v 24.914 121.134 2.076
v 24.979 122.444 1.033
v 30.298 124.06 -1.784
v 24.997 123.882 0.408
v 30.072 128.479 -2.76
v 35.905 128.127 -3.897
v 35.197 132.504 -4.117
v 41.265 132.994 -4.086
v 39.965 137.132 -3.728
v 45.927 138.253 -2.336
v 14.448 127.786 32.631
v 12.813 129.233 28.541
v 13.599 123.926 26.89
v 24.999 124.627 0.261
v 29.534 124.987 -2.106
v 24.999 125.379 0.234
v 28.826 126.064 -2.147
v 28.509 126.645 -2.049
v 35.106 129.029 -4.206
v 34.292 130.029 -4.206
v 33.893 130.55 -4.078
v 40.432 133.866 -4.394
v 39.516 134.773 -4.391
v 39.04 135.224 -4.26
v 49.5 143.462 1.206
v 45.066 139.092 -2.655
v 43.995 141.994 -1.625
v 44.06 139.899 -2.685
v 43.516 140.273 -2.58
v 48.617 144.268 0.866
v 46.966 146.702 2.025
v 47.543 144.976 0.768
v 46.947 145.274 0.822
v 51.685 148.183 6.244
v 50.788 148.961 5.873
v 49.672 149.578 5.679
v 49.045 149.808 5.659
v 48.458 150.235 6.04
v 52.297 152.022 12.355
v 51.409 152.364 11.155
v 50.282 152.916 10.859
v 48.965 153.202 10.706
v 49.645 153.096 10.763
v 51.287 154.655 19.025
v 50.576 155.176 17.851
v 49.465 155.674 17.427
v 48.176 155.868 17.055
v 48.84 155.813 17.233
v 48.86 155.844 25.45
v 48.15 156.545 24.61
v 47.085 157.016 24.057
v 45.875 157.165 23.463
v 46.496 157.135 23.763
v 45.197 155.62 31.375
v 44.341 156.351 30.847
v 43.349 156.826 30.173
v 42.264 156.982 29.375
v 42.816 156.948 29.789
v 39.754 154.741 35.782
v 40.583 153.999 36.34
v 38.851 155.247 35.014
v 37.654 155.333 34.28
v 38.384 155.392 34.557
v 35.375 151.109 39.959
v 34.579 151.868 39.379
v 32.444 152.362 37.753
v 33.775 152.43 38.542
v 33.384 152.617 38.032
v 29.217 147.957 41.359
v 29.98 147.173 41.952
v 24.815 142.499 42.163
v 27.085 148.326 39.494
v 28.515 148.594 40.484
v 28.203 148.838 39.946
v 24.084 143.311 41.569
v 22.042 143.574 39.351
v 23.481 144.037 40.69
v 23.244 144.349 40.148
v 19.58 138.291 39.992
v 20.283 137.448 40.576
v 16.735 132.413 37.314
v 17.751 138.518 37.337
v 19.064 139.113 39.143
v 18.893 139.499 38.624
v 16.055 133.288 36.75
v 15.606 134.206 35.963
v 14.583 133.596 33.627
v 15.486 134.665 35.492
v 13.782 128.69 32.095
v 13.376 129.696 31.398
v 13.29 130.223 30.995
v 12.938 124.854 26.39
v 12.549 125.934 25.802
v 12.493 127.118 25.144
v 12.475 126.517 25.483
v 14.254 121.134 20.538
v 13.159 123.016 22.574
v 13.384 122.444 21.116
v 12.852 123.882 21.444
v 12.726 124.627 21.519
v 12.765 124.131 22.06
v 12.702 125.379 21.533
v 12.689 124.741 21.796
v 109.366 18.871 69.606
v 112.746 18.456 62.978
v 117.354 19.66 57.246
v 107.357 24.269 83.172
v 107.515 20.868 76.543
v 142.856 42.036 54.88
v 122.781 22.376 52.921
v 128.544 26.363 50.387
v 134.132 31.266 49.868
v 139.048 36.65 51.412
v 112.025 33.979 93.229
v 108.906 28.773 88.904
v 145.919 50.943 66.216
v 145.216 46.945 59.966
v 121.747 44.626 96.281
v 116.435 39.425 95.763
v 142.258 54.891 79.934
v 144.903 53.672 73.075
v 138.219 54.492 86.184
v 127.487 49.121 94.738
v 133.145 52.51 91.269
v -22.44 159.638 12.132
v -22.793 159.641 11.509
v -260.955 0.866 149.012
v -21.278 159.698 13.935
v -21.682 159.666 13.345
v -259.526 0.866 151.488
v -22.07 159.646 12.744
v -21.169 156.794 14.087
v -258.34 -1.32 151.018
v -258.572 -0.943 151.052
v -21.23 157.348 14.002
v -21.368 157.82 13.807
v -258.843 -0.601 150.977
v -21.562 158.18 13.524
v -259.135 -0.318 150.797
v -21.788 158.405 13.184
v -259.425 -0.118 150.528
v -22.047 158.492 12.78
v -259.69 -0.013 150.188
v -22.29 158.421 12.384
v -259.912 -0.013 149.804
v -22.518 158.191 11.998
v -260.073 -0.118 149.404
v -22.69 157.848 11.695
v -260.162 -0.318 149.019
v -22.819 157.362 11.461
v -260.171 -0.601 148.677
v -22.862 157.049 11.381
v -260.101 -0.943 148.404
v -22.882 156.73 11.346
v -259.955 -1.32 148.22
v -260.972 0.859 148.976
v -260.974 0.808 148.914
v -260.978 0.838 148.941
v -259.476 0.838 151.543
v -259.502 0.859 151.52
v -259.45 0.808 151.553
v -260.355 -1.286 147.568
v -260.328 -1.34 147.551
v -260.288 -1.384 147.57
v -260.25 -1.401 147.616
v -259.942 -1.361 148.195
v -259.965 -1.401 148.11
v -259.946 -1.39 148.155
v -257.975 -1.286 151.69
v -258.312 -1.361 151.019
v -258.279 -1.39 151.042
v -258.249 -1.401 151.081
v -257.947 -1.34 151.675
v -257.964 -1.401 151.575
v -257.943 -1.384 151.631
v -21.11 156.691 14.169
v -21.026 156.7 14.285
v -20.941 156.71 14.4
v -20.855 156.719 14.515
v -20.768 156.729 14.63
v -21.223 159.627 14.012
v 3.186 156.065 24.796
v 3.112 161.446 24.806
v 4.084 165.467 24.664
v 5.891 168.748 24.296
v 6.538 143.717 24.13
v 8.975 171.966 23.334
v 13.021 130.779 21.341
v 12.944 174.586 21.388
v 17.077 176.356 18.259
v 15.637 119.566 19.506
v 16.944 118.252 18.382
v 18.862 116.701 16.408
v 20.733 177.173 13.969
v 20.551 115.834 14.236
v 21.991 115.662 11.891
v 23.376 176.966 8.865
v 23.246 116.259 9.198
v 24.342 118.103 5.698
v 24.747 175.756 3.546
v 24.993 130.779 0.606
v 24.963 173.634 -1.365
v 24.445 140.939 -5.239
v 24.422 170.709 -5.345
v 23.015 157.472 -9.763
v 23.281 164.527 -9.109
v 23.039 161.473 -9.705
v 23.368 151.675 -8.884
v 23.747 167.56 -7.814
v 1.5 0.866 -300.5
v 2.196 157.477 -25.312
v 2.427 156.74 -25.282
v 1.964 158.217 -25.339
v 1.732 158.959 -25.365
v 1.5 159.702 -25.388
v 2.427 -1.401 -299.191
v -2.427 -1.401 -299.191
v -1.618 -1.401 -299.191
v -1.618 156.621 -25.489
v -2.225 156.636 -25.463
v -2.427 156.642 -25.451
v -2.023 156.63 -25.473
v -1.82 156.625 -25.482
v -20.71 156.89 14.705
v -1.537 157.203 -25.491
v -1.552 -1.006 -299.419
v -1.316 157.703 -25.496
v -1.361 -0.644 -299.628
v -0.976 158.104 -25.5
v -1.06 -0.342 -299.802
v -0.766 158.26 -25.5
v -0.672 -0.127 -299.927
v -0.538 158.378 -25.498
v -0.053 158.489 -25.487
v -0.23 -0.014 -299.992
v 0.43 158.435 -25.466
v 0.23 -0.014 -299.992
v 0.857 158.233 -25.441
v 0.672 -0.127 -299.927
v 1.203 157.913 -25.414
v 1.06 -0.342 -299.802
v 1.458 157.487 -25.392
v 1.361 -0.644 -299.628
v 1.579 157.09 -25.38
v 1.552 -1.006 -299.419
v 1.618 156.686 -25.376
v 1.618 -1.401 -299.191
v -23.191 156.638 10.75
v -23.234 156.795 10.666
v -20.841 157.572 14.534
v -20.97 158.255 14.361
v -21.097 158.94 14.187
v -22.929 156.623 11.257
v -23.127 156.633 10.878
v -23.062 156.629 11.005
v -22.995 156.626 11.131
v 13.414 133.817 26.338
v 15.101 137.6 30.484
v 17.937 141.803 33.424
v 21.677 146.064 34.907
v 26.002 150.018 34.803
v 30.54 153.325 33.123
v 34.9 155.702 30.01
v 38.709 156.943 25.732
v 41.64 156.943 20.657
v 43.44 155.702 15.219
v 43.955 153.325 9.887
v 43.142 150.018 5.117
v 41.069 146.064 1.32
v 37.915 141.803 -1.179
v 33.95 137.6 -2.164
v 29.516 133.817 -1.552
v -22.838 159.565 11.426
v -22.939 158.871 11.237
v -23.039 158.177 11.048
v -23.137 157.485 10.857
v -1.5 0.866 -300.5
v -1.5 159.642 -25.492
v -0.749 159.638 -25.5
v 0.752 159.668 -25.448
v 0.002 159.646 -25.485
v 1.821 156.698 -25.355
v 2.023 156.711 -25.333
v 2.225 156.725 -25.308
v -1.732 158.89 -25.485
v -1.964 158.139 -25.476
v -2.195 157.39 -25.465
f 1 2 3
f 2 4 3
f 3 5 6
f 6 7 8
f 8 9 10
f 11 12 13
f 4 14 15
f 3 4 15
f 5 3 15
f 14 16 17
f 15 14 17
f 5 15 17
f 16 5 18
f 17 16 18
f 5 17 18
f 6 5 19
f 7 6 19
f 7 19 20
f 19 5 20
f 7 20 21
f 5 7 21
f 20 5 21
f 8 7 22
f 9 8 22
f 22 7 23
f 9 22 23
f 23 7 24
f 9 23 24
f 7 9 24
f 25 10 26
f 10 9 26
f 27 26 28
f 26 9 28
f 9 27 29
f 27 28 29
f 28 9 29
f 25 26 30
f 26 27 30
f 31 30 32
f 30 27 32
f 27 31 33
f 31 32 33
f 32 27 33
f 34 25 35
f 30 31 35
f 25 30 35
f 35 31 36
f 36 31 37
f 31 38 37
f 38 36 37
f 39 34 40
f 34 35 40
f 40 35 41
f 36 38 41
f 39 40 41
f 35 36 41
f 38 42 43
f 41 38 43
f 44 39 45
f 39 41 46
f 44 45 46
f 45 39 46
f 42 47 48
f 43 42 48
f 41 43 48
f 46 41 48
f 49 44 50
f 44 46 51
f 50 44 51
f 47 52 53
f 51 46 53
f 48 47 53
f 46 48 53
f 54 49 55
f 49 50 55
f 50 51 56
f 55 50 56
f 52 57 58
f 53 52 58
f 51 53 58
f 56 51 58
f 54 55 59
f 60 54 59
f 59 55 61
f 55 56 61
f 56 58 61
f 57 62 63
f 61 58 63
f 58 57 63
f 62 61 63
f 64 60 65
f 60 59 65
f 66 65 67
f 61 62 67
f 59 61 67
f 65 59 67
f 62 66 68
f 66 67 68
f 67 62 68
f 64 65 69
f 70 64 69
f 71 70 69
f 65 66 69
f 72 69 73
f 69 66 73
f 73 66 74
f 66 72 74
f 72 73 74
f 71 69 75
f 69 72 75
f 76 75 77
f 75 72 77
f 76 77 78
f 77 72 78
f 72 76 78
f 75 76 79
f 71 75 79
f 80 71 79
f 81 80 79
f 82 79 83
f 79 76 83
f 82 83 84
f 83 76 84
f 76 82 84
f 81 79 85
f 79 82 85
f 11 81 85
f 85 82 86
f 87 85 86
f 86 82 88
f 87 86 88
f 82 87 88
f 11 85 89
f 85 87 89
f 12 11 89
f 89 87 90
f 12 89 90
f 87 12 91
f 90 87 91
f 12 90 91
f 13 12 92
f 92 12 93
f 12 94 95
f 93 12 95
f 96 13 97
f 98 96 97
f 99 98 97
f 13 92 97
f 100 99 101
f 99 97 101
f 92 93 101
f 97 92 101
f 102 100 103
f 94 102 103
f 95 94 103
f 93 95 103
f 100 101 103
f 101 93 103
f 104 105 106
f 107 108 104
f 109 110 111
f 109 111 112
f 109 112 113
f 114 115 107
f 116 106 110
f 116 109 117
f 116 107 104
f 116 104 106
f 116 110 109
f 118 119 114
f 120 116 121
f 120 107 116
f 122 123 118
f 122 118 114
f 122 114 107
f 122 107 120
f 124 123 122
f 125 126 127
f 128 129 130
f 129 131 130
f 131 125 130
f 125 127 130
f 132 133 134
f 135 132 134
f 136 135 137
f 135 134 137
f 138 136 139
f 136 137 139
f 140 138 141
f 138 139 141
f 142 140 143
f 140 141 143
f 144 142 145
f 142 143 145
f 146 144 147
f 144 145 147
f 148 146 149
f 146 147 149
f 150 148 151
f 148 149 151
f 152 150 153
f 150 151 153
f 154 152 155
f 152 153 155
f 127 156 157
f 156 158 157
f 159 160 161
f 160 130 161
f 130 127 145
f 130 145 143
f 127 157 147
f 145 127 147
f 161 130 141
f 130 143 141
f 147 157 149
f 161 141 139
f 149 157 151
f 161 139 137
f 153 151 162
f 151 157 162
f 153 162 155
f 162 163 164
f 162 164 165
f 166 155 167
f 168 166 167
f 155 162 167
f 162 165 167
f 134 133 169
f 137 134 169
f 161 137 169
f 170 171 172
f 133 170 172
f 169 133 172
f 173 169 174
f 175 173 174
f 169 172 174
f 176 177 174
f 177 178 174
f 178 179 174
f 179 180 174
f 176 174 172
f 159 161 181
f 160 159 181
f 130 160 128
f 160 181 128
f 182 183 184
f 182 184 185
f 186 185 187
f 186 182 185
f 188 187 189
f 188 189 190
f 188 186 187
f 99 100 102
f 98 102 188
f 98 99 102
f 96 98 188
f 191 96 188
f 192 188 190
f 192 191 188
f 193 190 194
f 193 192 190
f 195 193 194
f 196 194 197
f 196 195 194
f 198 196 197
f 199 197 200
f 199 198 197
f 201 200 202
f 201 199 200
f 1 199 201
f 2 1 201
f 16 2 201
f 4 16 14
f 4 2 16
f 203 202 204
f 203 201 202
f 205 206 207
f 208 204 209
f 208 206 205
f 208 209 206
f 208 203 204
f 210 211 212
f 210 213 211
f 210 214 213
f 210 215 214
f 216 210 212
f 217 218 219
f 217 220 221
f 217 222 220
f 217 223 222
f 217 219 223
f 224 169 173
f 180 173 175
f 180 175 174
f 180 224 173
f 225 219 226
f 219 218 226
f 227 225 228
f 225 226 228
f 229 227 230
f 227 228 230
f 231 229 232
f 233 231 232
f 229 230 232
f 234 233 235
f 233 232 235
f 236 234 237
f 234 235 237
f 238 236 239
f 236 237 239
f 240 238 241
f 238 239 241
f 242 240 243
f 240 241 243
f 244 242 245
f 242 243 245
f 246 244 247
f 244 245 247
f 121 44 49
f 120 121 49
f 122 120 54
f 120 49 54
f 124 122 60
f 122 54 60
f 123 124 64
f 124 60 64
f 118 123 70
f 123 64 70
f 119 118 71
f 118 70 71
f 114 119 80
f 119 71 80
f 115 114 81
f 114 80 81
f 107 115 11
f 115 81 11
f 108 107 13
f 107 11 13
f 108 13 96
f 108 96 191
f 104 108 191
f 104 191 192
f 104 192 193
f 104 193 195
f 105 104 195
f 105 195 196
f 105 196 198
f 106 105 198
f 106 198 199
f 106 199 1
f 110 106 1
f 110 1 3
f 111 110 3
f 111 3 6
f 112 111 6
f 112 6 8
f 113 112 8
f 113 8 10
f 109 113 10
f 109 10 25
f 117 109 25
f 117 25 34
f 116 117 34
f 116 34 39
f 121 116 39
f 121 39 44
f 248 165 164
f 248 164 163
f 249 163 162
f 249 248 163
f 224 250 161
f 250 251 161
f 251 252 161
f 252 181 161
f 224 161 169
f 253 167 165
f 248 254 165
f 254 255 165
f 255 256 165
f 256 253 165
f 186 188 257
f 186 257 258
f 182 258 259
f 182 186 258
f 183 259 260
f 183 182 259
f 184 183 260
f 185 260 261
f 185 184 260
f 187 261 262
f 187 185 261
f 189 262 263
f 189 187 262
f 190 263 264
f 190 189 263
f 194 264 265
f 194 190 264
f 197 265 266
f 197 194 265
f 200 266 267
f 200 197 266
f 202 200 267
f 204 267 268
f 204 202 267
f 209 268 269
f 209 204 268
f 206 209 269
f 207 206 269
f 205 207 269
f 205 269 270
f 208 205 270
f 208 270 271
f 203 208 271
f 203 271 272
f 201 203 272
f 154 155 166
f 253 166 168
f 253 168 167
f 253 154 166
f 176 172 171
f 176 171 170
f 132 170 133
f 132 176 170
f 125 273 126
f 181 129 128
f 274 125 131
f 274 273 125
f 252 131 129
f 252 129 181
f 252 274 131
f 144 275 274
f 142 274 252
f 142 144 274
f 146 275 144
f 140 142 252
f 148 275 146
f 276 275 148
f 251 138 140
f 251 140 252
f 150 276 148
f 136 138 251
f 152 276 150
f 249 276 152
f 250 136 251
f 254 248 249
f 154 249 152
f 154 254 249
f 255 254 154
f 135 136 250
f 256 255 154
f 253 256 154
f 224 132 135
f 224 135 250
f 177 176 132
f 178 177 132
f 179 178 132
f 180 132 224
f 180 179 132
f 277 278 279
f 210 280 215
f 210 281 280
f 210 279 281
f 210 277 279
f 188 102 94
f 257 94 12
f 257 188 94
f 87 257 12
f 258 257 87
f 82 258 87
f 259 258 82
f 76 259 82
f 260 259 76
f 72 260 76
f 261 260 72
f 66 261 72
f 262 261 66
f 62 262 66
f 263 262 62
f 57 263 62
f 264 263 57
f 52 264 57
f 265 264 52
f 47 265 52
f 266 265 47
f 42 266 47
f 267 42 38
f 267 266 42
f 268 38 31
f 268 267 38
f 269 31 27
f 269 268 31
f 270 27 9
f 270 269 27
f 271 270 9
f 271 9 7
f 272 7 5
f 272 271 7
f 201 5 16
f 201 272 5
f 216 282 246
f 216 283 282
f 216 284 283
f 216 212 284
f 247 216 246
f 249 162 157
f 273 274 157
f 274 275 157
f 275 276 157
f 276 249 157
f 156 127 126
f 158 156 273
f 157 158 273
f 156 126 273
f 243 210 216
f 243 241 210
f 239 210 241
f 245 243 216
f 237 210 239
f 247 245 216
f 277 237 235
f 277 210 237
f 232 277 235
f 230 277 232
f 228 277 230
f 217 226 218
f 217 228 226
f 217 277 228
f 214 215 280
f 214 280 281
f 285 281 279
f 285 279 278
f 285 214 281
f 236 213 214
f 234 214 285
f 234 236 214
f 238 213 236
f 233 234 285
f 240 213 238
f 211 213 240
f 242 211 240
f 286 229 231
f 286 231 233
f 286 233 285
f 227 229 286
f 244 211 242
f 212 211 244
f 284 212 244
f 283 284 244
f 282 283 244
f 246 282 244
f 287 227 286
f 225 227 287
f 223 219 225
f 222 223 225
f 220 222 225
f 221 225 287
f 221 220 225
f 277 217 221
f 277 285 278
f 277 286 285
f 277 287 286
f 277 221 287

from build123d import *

# Parameters (mm, degrees)
CIRPATTERN2_START   = -259.807621119
CIRPATTERN2_DEPTH   = 346.410161535
SKETCH7_R           = 25
CUT_EXTRUDE1_DEPTH  = 435.415827251
SKETCH9_R           = 20
BOSS_EXTRUDE2_DEPTH = 50
SKETCH10_R          = 25
BOSS_EXTRUDE3_DEPTH = 150
CHAMFER2_SIZE       = 5
SKETCH12_R          = 25
CUT_EXTRUDE2_DEPTH  = 441.105369443
FILLET2_R           = 0.1


with BuildPart() as part:
    # Sweep3: sweep along a path in Sketch5
    with BuildLine(Plane(origin=(0, 0, 0), x_dir=(0, 0, -1), z_dir=(1, 0, 0))) as sweep3_path:
        Line((0, 173.2050808), (300, 0))
    # Sketch6 → Sweep3 (sweep)
    with BuildSketch(Plane(origin=(0, 173.2050808, 0), x_dir=(-1, 0, 0), z_dir=(0, -0.500000000093341, -0.8660254037305483))):
        with BuildLine():
            Line((-1.6180339, -1.6180339), (-2.4270505, -1.6180339))
            Line((-2.4270505, -1.6180339), (-1.5, 1))
            Line((-1.5, 1), (1.5, 1))
            Line((1.5, 1), (2.4270505, -1.6180339))
            Line((2.4270505, -1.6180339), (1.6180339, -1.6180339))
            ThreePointArc((1.6180339, -1.6180339), (0, 0), (-1.6180339, -1.6180339))
        make_face()
    sweep(path=sweep3_path.line)

    # CirPattern2: read off the stored shape, not the designer's step
    # CirPattern2 outline → CirPattern2 (add)
    with BuildSketch(Plane(origin=(0, 0, 0), x_dir=(0.6614378278190619, -0.5669467095390479, 0.49099025293059273), z_dir=(0.7499999999533339, 0.5000000000933409, -0.4330127018652669)).offset(CIRPATTERN2_START)):
        with BuildLine():
            Line((-97.718810887, -115.127251367), (-95.304121077, -113.755100773))
            Line((-95.304121077, -113.755100773), (-95.915680142, -113.225475086))
            ThreePointArc((-95.915680142, -113.225475086), (-98.198050635, -113.389341915), (-98.361917463, -111.106971422))
            Line((-98.361917463, -111.106971422), (-98.973476529, -110.577345735))
            Line((-98.973476529, -110.577345735), (-99.986597725, -113.163290355))
            Line((-99.986597725, -113.163290355), (-97.718810887, -115.127251367))
        make_face()
    extrude(amount=CIRPATTERN2_DEPTH)

    # Sketch7 → Cut-Extrude1 (cut, through all)
    with BuildSketch(Plane(origin=(0, 0, 0), x_dir=(1, 0, 0), z_dir=(0, 1, 0))):
        with Locations((-0.866025404, 0.5)):
            Circle(SKETCH7_R)
    extrude(amount=CUT_EXTRUDE1_DEPTH, mode=Mode.SUBTRACT)


with BuildPart() as cut_extrude1_piece_1:
    # of the separate pieces the step leaves, piece 1, a body of its own (cut_extrude1_pieces)
    add(part.part.solids().sort_by_distance((-258.297974954, -1.401258462, 150.996749986))[0])

    # Fillet2
    fillet2_edges = [cut_extrude1_piece_1.edges().sort_by_distance(p)[0] for p in [
        (-139.732731811, 77.642236986, 82.543074941),
        (-141.399438173, 77.609788679, 79.768659077),
        (-139.287468833, 77.669406772, 83.220174144),
        (-140.363551006, 80.284080644, 82.770984765),
        (-141.908659495, 80.254008319, 80.198951952),
        (-141.787721189, 77.620605535, 79.058662477),
    ]]
    fillet(fillet2_edges, radius=FILLET2_R)


with BuildPart() as cut_extrude1_piece_2:
    # of the separate pieces the step leaves, piece 2, a body of its own (cut_extrude1_pieces)
    add(part.part.solids().sort_by_distance((2.4270505, 156.740072006, -25.282163971))[0])


with BuildPart() as body_3:
    # Sketch9 → Boss-Extrude2 (new body)
    with BuildSketch(Plane(origin=(0, 173.2050808, 0), x_dir=(0.7742767082385598, 0.5579539715562799, -0.2986351364187311), z_dir=(-0.6328472004198645, 0.6826462440832614, -0.36537450151831374))):
        with Locations(Location((0, 0, 0), (0, 0, 161.287709375))):
            Circle(SKETCH9_R)
    extrude(amount=-BOSS_EXTRUDE2_DEPTH)

    # Sketch10 → Boss-Extrude3 (add)
    with BuildSketch(Plane(origin=(-43.184099341, 46.582276417, -24.932351379), x_dir=(0.7742767082385598, 0.5579539715562799, -0.29863513641873113), z_dir=(0.6328472004198645, -0.6826462440832614, 0.36537450151831374))):
        with Locations(Location((96.640462726, 81.733983968, 0), (0, 0, 18.712290625))):
            Circle(SKETCH10_R)
    extrude(amount=BOSS_EXTRUDE3_DEPTH)

    # Chamfer2
    chamfer2_edges = [body_3.edges().sort_by_distance(p)[0] for p in [
        (46.309351779, 152.669803301, 18.268725076),
    ]]
    chamfer(chamfer2_edges, length=CHAMFER2_SIZE - 0.0001)  # a hair under: the kernel refuses the full size

    # Fillet1: read off the stored shape, not the designer's step
    # Fillet1 outline → Fillet1 (revolve, cut)
    with BuildSketch(Plane(origin=(74.826459362, 92.490492179, 43.201076455), x_dir=(0.7742767082385594, 0.55795397155628, -0.2986351364187316), z_dir=(0, -0.4718913763395034, -0.8816566956227401))):
        with BuildLine():
            Line((25, -69.702263958), (25, -66.166730052))
            ThreePointArc((25, -66.166730052), (24.619397663, -68.080147214), (23.535533906, -69.702263958))
            Line((23.535533906, -69.702263958), (25, -69.702263958))
        make_face()
    revolve(axis=Axis((74.826459362, 92.490492179, 43.201076455), (0.6328472004198648, -0.6826462440832607, 0.3653745015183139)), mode=Mode.SUBTRACT)

    # Sketch12 → Cut-Extrude2 (cut, through all)
    with BuildSketch(Plane(origin=(0, 0, 0), x_dir=(1, 0, 0), z_dir=(0, 1, 0))):
        Circle(SKETCH12_R)
    extrude(amount=CUT_EXTRUDE2_DEPTH, mode=Mode.SUBTRACT)


solid = Compound([cut_extrude1_piece_1.part, cut_extrude1_piece_2.part, body_3.part])
